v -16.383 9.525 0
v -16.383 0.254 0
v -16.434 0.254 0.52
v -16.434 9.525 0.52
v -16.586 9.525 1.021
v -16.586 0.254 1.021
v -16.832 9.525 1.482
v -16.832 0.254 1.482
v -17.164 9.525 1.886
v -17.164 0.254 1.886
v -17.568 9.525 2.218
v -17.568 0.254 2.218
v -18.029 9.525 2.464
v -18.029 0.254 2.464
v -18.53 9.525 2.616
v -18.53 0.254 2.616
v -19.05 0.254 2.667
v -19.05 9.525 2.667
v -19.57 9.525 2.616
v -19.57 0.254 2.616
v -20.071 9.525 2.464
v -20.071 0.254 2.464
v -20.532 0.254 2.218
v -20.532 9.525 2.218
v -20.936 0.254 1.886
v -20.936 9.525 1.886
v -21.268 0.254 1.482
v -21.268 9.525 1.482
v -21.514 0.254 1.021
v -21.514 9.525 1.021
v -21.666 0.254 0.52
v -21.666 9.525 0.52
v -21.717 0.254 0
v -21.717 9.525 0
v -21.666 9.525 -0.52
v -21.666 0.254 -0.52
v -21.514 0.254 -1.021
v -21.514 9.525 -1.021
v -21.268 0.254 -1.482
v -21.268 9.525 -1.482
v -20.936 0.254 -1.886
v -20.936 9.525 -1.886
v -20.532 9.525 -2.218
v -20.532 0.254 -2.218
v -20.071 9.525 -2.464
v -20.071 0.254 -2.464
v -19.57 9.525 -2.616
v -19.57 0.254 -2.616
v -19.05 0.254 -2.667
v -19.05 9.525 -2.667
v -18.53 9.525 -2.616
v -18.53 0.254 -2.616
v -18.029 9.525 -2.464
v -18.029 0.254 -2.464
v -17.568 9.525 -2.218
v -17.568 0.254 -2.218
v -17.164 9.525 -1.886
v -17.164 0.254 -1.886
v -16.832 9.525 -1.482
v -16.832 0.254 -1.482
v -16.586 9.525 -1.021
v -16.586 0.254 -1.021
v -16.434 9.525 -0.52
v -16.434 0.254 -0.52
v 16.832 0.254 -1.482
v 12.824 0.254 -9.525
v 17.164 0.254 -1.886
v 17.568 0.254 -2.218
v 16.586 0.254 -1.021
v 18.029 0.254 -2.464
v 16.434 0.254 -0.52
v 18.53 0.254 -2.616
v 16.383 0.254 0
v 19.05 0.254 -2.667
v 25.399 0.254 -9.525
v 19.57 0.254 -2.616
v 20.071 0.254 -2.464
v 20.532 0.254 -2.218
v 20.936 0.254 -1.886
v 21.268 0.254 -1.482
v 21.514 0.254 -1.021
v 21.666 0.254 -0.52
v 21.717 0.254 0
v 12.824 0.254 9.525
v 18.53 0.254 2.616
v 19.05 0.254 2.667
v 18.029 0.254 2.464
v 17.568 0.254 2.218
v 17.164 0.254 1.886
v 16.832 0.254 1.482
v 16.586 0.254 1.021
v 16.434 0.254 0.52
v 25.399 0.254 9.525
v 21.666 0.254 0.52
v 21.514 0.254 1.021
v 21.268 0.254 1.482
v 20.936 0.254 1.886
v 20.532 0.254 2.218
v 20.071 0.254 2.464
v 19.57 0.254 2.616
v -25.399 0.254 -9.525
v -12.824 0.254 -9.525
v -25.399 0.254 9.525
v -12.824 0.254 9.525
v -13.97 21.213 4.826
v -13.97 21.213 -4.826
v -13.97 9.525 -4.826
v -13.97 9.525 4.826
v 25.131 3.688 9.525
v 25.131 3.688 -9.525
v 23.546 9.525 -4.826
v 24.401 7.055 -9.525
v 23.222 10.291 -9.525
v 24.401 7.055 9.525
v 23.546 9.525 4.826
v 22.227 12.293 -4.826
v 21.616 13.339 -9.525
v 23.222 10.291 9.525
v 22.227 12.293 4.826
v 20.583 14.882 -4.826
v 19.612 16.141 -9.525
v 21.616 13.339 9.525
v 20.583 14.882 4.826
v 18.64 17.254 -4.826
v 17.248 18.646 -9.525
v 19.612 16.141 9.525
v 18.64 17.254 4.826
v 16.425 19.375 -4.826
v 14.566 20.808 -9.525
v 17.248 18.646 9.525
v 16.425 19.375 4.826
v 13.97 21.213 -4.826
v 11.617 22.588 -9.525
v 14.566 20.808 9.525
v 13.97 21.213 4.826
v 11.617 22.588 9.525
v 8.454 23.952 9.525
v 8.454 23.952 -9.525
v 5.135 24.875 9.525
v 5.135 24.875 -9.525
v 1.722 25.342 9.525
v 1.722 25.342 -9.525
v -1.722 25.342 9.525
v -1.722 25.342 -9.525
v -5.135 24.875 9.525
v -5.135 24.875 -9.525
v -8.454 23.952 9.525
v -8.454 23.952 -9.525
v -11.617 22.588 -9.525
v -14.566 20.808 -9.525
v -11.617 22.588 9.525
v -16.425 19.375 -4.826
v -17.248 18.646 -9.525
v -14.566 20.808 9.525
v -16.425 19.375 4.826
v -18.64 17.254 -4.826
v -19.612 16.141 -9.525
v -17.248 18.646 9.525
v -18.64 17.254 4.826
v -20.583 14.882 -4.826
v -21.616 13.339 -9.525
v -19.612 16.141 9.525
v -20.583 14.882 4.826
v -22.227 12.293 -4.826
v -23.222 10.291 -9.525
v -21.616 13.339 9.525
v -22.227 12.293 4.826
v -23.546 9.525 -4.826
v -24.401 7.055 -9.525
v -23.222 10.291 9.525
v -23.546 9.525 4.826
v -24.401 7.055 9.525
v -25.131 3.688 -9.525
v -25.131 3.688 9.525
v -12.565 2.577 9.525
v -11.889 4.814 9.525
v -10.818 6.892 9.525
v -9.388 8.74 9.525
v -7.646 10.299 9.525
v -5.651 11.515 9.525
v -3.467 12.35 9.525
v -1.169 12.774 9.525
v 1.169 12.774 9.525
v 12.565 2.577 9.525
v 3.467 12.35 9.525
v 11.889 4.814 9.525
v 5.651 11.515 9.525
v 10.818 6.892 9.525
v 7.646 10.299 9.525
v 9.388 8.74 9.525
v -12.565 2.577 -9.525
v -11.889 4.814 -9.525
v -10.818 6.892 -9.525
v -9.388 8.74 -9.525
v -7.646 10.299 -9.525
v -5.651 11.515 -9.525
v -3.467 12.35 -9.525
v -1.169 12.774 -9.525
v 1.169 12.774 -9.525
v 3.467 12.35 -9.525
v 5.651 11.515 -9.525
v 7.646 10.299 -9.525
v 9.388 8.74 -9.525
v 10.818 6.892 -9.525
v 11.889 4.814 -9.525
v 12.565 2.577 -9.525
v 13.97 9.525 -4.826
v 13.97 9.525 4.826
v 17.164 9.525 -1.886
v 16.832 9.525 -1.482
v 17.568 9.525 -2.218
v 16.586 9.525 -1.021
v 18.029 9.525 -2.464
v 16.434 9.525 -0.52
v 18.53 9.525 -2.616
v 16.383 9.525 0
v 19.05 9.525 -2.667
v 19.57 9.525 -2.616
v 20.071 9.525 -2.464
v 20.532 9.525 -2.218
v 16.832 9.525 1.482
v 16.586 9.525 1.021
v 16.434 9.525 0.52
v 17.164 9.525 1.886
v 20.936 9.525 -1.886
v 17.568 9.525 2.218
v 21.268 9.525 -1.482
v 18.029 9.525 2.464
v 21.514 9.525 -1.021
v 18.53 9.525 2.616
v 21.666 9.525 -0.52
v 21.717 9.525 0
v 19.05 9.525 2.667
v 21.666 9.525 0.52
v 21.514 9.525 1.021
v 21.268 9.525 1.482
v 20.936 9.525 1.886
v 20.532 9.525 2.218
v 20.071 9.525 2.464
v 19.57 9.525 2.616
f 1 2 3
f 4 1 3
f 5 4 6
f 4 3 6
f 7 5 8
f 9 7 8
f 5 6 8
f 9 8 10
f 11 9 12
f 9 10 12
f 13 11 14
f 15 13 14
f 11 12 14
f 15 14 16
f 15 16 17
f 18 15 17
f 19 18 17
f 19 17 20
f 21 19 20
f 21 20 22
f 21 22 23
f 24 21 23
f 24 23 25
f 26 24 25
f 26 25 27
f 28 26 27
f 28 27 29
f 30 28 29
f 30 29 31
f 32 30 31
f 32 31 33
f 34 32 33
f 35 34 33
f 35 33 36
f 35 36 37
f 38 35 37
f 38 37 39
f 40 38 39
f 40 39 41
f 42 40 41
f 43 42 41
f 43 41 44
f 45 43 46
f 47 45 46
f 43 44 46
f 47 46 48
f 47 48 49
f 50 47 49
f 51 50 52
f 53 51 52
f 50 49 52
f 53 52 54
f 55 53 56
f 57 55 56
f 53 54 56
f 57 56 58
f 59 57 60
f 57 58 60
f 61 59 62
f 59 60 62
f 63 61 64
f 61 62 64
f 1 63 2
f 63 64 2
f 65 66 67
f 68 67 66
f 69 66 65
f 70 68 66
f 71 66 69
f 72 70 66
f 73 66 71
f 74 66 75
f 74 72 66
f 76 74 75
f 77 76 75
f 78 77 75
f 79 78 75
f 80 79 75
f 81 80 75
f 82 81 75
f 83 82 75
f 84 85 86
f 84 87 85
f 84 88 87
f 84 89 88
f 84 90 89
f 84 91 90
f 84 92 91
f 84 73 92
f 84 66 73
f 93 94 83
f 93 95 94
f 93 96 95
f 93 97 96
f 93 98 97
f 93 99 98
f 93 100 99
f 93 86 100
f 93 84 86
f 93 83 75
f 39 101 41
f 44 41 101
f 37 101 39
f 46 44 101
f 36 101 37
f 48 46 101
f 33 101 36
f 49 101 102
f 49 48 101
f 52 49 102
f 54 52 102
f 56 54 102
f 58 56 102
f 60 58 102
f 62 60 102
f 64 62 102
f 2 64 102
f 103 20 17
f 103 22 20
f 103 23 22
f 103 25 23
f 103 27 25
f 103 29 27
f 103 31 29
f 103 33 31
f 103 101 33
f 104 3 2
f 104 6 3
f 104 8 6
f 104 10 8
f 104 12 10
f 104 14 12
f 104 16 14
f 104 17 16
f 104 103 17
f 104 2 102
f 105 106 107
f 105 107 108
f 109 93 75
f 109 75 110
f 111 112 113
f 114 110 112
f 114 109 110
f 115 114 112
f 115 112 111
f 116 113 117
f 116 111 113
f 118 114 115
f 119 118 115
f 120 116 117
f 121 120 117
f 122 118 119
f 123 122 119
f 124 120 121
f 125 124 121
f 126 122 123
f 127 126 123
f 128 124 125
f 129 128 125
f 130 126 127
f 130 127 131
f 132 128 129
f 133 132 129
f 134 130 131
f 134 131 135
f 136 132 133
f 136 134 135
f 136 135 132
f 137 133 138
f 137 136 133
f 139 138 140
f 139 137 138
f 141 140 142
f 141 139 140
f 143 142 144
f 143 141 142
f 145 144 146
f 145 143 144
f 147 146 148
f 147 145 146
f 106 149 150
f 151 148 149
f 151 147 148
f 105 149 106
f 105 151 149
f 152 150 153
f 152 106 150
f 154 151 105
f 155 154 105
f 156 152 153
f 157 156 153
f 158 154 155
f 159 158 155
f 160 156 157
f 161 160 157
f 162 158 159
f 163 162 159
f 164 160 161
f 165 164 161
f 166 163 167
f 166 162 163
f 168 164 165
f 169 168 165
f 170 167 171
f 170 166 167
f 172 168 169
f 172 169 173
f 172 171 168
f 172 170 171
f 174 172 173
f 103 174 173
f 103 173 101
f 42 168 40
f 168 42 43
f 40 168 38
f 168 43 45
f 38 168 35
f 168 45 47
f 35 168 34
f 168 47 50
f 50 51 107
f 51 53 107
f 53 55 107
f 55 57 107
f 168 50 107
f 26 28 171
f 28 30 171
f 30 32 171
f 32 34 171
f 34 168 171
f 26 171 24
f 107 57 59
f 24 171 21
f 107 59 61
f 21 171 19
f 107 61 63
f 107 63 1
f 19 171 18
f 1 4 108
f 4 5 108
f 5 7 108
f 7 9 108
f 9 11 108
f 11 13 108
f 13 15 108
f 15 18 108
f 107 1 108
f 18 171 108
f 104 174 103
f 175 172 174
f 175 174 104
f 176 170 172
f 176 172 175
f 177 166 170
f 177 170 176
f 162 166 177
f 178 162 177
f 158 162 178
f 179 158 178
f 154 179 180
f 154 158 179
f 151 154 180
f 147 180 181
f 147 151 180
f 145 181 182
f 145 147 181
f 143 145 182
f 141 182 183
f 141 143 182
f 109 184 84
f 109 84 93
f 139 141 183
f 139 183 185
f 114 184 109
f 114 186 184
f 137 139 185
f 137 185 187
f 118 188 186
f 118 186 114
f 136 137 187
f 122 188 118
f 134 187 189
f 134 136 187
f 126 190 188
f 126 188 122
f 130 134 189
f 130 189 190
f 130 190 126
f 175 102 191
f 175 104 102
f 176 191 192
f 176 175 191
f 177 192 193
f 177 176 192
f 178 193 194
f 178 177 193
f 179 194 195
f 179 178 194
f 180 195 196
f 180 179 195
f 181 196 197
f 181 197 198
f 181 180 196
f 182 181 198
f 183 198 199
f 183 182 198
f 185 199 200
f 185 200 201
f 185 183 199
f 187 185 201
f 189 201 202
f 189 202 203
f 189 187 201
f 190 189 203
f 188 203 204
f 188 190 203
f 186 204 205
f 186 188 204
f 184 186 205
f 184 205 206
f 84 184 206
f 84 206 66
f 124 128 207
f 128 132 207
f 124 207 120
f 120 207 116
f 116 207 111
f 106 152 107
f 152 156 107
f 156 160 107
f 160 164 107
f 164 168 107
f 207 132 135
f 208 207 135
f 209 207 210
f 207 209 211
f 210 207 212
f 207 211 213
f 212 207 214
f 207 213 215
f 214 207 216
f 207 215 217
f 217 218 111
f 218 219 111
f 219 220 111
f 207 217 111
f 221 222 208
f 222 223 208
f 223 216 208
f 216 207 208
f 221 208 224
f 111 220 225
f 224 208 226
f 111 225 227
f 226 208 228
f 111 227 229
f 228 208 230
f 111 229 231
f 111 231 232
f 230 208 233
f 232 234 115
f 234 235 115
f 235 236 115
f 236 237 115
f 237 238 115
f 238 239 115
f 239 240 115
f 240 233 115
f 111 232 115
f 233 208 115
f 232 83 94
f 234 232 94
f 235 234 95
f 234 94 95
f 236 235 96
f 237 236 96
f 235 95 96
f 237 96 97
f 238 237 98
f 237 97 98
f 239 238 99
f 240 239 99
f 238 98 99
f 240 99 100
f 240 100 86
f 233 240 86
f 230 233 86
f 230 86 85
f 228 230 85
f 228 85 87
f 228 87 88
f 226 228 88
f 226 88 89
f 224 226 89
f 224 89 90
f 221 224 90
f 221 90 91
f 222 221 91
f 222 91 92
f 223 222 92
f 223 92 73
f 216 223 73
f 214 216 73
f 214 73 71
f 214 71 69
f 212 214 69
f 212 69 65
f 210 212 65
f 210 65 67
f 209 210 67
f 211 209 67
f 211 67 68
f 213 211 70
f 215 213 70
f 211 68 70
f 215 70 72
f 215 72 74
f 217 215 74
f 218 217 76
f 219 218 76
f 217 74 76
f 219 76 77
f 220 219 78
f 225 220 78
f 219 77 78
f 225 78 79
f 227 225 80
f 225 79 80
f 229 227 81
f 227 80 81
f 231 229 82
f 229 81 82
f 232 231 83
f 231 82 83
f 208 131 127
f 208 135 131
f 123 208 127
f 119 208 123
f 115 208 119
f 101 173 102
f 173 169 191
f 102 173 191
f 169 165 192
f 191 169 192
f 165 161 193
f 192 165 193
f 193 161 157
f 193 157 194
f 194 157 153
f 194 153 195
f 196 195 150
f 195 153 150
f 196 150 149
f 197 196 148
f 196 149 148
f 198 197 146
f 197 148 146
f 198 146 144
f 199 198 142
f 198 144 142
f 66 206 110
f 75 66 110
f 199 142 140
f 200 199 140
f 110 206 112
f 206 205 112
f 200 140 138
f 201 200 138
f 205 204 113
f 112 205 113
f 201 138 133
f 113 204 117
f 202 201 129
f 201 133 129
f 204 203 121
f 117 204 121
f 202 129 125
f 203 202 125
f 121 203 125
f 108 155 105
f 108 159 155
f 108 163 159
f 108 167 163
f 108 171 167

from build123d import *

# Parameters (mm, degrees)
F1_DEPTH = 9.525
F2_R     = 2.667
F4_DEPTH = 25.401
F5_W     = 11.42873
F5_H     = 9.652
F6_DEPTH = 15.876


with BuildPart() as f1:
    # F0 (on Top) → F1 (new body, symmetric)
    with BuildSketch(Plane.XY):
        with BuildLine():
            ThreePointArc((-12.824485, 0.254), (0, 12.827), (12.824485, 0.254))
            Line((12.824485, 0.254), (25.39873, 0.254))
            ThreePointArc((25.39873, 0.254), (0, 25.4), (-25.39873, 0.254))
            Line((-25.39873, 0.254), (-12.824485, 0.254))
        make_face()
    extrude(amount=F1_DEPTH, both=True)

    # F2 (on Front) → F4 (cut, through all)
    with BuildSketch(Plane.XZ):
        with Locations((-19.05, 0)):
            Circle(F2_R)
        with Locations((19.05, 0)):
            Circle(F2_R)
    extrude(amount=-F4_DEPTH, mode=Mode.SUBTRACT)

    # F5 (on offset) → F6 (cut, through all)
    with BuildSketch(Plane.XZ.offset(-9.525)):
        with Locations((19.684365, 0)):
            Rectangle(F5_W, F5_H)
        with Locations((-19.684365, 0)):
            Rectangle(F5_W, F5_H)
    extrude(amount=-F6_DEPTH, mode=Mode.SUBTRACT)


solid = f1.part
